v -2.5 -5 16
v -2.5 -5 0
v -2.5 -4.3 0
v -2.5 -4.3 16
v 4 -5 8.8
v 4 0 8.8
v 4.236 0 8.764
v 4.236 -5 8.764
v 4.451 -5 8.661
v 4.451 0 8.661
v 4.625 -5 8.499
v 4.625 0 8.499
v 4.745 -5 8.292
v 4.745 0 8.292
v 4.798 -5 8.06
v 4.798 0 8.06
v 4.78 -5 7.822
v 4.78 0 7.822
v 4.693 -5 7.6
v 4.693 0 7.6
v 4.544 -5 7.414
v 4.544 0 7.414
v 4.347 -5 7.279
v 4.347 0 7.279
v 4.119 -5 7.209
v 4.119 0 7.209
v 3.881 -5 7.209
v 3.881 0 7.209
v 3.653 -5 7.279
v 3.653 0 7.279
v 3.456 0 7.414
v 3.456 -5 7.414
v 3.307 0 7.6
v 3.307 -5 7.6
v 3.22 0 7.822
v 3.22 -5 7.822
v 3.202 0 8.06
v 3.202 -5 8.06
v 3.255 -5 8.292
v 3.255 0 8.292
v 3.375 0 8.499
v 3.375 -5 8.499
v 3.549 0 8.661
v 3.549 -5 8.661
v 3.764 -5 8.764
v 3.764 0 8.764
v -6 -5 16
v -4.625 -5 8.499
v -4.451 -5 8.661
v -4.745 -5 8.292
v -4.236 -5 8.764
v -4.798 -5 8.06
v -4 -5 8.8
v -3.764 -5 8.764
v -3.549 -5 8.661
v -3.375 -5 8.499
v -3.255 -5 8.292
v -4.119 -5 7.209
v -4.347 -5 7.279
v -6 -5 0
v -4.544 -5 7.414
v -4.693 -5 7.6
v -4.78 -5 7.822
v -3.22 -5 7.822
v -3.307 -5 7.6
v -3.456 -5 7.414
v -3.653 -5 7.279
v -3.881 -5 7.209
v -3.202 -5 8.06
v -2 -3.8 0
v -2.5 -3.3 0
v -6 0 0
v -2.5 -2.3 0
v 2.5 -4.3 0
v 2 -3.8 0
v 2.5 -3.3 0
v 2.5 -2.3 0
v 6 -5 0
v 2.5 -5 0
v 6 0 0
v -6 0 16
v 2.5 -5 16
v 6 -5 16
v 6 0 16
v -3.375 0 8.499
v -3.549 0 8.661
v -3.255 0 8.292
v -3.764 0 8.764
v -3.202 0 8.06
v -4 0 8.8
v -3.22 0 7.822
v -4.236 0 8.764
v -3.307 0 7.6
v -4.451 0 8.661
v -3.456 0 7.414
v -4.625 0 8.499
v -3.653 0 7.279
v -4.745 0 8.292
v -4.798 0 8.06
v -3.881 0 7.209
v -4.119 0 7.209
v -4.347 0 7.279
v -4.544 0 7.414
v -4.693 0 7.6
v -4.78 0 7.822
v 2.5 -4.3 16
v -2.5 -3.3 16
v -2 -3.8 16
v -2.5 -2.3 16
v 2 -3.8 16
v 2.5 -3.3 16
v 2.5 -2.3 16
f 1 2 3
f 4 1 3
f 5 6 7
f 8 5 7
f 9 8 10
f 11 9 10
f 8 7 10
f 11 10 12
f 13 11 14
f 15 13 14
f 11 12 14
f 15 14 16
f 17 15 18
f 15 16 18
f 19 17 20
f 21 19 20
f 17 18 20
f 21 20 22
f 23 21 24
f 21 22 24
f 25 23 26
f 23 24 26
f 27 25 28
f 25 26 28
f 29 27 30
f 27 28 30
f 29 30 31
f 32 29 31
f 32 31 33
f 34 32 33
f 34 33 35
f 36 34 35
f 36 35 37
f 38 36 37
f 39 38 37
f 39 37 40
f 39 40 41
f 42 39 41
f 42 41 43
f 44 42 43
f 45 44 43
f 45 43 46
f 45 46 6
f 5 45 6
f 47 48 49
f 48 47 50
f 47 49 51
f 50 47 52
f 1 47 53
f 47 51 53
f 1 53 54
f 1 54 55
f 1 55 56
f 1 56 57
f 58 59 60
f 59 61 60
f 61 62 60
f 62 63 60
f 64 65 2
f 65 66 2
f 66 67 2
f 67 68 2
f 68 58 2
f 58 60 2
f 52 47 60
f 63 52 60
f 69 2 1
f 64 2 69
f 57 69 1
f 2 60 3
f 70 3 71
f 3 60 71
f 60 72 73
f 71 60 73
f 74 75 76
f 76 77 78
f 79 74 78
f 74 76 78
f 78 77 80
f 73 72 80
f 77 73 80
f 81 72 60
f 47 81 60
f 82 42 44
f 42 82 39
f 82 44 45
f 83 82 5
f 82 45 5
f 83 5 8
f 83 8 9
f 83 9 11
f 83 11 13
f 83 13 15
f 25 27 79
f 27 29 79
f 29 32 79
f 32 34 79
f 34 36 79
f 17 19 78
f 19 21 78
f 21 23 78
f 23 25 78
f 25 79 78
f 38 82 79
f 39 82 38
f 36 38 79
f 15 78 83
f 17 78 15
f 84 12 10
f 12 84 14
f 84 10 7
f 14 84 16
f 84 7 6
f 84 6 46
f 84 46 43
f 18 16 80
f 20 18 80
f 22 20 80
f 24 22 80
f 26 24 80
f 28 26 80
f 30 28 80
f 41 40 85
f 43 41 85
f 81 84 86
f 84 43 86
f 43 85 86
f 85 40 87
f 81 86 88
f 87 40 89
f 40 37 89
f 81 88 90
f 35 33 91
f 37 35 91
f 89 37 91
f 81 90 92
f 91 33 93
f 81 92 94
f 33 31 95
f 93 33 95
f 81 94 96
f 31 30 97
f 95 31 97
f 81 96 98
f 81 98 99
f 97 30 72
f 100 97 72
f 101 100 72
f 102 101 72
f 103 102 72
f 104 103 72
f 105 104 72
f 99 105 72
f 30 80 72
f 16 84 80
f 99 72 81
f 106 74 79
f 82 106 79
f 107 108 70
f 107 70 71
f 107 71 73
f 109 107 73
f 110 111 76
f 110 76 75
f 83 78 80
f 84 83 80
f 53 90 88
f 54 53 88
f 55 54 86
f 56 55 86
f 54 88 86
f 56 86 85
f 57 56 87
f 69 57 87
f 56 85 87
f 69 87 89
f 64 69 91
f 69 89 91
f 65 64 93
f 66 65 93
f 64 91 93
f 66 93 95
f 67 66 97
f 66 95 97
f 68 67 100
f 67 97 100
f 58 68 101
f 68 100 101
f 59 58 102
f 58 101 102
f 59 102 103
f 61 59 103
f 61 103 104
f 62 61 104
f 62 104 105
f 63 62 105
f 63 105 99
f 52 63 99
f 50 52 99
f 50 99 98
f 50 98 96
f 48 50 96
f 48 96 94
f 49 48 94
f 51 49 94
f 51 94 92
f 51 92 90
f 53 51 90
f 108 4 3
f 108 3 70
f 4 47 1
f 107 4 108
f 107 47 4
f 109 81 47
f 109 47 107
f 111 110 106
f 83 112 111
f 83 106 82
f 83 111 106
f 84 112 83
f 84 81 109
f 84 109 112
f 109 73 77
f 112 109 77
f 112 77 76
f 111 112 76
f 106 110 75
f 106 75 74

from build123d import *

# Parameters (mm, degrees)
BOSS_EXTRUDE1_DEPTH = 16
SKETCH2_R           = 0.8
CUT_EXTRUDE1_DEPTH  = 16


with BuildPart() as part:
    # Sketch1 → Boss-Extrude1 (new body)
    with BuildSketch(Plane.XY):
        Polygon((6, 0), (-6, 0), (-6, -5), (-2.5, -5), (-2.5, -4.3), (-2, -3.8), (-2.5, -3.3), (-2.5, -2.3), (2.5, -2.3), (2.5, -3.3), (2, -3.8), (2.5, -4.3), (2.5, -5), (6, -5), align=None)
    extrude(amount=BOSS_EXTRUDE1_DEPTH)

    # Sketch2 → Cut-Extrude1 (cut)
    with BuildSketch(Plane(origin=(0, 0, 0), x_dir=(1, 0, 0), z_dir=(0, 1, 0))):
        with Locations(Location((-4, -8, 0), (0, 0, 270))):
            Circle(SKETCH2_R)
        with Locations(Location((4, -8, 0), (0, 0, 270))):
            Circle(SKETCH2_R)
    extrude(amount=-CUT_EXTRUDE1_DEPTH, mode=Mode.SUBTRACT)


solid = part.part
